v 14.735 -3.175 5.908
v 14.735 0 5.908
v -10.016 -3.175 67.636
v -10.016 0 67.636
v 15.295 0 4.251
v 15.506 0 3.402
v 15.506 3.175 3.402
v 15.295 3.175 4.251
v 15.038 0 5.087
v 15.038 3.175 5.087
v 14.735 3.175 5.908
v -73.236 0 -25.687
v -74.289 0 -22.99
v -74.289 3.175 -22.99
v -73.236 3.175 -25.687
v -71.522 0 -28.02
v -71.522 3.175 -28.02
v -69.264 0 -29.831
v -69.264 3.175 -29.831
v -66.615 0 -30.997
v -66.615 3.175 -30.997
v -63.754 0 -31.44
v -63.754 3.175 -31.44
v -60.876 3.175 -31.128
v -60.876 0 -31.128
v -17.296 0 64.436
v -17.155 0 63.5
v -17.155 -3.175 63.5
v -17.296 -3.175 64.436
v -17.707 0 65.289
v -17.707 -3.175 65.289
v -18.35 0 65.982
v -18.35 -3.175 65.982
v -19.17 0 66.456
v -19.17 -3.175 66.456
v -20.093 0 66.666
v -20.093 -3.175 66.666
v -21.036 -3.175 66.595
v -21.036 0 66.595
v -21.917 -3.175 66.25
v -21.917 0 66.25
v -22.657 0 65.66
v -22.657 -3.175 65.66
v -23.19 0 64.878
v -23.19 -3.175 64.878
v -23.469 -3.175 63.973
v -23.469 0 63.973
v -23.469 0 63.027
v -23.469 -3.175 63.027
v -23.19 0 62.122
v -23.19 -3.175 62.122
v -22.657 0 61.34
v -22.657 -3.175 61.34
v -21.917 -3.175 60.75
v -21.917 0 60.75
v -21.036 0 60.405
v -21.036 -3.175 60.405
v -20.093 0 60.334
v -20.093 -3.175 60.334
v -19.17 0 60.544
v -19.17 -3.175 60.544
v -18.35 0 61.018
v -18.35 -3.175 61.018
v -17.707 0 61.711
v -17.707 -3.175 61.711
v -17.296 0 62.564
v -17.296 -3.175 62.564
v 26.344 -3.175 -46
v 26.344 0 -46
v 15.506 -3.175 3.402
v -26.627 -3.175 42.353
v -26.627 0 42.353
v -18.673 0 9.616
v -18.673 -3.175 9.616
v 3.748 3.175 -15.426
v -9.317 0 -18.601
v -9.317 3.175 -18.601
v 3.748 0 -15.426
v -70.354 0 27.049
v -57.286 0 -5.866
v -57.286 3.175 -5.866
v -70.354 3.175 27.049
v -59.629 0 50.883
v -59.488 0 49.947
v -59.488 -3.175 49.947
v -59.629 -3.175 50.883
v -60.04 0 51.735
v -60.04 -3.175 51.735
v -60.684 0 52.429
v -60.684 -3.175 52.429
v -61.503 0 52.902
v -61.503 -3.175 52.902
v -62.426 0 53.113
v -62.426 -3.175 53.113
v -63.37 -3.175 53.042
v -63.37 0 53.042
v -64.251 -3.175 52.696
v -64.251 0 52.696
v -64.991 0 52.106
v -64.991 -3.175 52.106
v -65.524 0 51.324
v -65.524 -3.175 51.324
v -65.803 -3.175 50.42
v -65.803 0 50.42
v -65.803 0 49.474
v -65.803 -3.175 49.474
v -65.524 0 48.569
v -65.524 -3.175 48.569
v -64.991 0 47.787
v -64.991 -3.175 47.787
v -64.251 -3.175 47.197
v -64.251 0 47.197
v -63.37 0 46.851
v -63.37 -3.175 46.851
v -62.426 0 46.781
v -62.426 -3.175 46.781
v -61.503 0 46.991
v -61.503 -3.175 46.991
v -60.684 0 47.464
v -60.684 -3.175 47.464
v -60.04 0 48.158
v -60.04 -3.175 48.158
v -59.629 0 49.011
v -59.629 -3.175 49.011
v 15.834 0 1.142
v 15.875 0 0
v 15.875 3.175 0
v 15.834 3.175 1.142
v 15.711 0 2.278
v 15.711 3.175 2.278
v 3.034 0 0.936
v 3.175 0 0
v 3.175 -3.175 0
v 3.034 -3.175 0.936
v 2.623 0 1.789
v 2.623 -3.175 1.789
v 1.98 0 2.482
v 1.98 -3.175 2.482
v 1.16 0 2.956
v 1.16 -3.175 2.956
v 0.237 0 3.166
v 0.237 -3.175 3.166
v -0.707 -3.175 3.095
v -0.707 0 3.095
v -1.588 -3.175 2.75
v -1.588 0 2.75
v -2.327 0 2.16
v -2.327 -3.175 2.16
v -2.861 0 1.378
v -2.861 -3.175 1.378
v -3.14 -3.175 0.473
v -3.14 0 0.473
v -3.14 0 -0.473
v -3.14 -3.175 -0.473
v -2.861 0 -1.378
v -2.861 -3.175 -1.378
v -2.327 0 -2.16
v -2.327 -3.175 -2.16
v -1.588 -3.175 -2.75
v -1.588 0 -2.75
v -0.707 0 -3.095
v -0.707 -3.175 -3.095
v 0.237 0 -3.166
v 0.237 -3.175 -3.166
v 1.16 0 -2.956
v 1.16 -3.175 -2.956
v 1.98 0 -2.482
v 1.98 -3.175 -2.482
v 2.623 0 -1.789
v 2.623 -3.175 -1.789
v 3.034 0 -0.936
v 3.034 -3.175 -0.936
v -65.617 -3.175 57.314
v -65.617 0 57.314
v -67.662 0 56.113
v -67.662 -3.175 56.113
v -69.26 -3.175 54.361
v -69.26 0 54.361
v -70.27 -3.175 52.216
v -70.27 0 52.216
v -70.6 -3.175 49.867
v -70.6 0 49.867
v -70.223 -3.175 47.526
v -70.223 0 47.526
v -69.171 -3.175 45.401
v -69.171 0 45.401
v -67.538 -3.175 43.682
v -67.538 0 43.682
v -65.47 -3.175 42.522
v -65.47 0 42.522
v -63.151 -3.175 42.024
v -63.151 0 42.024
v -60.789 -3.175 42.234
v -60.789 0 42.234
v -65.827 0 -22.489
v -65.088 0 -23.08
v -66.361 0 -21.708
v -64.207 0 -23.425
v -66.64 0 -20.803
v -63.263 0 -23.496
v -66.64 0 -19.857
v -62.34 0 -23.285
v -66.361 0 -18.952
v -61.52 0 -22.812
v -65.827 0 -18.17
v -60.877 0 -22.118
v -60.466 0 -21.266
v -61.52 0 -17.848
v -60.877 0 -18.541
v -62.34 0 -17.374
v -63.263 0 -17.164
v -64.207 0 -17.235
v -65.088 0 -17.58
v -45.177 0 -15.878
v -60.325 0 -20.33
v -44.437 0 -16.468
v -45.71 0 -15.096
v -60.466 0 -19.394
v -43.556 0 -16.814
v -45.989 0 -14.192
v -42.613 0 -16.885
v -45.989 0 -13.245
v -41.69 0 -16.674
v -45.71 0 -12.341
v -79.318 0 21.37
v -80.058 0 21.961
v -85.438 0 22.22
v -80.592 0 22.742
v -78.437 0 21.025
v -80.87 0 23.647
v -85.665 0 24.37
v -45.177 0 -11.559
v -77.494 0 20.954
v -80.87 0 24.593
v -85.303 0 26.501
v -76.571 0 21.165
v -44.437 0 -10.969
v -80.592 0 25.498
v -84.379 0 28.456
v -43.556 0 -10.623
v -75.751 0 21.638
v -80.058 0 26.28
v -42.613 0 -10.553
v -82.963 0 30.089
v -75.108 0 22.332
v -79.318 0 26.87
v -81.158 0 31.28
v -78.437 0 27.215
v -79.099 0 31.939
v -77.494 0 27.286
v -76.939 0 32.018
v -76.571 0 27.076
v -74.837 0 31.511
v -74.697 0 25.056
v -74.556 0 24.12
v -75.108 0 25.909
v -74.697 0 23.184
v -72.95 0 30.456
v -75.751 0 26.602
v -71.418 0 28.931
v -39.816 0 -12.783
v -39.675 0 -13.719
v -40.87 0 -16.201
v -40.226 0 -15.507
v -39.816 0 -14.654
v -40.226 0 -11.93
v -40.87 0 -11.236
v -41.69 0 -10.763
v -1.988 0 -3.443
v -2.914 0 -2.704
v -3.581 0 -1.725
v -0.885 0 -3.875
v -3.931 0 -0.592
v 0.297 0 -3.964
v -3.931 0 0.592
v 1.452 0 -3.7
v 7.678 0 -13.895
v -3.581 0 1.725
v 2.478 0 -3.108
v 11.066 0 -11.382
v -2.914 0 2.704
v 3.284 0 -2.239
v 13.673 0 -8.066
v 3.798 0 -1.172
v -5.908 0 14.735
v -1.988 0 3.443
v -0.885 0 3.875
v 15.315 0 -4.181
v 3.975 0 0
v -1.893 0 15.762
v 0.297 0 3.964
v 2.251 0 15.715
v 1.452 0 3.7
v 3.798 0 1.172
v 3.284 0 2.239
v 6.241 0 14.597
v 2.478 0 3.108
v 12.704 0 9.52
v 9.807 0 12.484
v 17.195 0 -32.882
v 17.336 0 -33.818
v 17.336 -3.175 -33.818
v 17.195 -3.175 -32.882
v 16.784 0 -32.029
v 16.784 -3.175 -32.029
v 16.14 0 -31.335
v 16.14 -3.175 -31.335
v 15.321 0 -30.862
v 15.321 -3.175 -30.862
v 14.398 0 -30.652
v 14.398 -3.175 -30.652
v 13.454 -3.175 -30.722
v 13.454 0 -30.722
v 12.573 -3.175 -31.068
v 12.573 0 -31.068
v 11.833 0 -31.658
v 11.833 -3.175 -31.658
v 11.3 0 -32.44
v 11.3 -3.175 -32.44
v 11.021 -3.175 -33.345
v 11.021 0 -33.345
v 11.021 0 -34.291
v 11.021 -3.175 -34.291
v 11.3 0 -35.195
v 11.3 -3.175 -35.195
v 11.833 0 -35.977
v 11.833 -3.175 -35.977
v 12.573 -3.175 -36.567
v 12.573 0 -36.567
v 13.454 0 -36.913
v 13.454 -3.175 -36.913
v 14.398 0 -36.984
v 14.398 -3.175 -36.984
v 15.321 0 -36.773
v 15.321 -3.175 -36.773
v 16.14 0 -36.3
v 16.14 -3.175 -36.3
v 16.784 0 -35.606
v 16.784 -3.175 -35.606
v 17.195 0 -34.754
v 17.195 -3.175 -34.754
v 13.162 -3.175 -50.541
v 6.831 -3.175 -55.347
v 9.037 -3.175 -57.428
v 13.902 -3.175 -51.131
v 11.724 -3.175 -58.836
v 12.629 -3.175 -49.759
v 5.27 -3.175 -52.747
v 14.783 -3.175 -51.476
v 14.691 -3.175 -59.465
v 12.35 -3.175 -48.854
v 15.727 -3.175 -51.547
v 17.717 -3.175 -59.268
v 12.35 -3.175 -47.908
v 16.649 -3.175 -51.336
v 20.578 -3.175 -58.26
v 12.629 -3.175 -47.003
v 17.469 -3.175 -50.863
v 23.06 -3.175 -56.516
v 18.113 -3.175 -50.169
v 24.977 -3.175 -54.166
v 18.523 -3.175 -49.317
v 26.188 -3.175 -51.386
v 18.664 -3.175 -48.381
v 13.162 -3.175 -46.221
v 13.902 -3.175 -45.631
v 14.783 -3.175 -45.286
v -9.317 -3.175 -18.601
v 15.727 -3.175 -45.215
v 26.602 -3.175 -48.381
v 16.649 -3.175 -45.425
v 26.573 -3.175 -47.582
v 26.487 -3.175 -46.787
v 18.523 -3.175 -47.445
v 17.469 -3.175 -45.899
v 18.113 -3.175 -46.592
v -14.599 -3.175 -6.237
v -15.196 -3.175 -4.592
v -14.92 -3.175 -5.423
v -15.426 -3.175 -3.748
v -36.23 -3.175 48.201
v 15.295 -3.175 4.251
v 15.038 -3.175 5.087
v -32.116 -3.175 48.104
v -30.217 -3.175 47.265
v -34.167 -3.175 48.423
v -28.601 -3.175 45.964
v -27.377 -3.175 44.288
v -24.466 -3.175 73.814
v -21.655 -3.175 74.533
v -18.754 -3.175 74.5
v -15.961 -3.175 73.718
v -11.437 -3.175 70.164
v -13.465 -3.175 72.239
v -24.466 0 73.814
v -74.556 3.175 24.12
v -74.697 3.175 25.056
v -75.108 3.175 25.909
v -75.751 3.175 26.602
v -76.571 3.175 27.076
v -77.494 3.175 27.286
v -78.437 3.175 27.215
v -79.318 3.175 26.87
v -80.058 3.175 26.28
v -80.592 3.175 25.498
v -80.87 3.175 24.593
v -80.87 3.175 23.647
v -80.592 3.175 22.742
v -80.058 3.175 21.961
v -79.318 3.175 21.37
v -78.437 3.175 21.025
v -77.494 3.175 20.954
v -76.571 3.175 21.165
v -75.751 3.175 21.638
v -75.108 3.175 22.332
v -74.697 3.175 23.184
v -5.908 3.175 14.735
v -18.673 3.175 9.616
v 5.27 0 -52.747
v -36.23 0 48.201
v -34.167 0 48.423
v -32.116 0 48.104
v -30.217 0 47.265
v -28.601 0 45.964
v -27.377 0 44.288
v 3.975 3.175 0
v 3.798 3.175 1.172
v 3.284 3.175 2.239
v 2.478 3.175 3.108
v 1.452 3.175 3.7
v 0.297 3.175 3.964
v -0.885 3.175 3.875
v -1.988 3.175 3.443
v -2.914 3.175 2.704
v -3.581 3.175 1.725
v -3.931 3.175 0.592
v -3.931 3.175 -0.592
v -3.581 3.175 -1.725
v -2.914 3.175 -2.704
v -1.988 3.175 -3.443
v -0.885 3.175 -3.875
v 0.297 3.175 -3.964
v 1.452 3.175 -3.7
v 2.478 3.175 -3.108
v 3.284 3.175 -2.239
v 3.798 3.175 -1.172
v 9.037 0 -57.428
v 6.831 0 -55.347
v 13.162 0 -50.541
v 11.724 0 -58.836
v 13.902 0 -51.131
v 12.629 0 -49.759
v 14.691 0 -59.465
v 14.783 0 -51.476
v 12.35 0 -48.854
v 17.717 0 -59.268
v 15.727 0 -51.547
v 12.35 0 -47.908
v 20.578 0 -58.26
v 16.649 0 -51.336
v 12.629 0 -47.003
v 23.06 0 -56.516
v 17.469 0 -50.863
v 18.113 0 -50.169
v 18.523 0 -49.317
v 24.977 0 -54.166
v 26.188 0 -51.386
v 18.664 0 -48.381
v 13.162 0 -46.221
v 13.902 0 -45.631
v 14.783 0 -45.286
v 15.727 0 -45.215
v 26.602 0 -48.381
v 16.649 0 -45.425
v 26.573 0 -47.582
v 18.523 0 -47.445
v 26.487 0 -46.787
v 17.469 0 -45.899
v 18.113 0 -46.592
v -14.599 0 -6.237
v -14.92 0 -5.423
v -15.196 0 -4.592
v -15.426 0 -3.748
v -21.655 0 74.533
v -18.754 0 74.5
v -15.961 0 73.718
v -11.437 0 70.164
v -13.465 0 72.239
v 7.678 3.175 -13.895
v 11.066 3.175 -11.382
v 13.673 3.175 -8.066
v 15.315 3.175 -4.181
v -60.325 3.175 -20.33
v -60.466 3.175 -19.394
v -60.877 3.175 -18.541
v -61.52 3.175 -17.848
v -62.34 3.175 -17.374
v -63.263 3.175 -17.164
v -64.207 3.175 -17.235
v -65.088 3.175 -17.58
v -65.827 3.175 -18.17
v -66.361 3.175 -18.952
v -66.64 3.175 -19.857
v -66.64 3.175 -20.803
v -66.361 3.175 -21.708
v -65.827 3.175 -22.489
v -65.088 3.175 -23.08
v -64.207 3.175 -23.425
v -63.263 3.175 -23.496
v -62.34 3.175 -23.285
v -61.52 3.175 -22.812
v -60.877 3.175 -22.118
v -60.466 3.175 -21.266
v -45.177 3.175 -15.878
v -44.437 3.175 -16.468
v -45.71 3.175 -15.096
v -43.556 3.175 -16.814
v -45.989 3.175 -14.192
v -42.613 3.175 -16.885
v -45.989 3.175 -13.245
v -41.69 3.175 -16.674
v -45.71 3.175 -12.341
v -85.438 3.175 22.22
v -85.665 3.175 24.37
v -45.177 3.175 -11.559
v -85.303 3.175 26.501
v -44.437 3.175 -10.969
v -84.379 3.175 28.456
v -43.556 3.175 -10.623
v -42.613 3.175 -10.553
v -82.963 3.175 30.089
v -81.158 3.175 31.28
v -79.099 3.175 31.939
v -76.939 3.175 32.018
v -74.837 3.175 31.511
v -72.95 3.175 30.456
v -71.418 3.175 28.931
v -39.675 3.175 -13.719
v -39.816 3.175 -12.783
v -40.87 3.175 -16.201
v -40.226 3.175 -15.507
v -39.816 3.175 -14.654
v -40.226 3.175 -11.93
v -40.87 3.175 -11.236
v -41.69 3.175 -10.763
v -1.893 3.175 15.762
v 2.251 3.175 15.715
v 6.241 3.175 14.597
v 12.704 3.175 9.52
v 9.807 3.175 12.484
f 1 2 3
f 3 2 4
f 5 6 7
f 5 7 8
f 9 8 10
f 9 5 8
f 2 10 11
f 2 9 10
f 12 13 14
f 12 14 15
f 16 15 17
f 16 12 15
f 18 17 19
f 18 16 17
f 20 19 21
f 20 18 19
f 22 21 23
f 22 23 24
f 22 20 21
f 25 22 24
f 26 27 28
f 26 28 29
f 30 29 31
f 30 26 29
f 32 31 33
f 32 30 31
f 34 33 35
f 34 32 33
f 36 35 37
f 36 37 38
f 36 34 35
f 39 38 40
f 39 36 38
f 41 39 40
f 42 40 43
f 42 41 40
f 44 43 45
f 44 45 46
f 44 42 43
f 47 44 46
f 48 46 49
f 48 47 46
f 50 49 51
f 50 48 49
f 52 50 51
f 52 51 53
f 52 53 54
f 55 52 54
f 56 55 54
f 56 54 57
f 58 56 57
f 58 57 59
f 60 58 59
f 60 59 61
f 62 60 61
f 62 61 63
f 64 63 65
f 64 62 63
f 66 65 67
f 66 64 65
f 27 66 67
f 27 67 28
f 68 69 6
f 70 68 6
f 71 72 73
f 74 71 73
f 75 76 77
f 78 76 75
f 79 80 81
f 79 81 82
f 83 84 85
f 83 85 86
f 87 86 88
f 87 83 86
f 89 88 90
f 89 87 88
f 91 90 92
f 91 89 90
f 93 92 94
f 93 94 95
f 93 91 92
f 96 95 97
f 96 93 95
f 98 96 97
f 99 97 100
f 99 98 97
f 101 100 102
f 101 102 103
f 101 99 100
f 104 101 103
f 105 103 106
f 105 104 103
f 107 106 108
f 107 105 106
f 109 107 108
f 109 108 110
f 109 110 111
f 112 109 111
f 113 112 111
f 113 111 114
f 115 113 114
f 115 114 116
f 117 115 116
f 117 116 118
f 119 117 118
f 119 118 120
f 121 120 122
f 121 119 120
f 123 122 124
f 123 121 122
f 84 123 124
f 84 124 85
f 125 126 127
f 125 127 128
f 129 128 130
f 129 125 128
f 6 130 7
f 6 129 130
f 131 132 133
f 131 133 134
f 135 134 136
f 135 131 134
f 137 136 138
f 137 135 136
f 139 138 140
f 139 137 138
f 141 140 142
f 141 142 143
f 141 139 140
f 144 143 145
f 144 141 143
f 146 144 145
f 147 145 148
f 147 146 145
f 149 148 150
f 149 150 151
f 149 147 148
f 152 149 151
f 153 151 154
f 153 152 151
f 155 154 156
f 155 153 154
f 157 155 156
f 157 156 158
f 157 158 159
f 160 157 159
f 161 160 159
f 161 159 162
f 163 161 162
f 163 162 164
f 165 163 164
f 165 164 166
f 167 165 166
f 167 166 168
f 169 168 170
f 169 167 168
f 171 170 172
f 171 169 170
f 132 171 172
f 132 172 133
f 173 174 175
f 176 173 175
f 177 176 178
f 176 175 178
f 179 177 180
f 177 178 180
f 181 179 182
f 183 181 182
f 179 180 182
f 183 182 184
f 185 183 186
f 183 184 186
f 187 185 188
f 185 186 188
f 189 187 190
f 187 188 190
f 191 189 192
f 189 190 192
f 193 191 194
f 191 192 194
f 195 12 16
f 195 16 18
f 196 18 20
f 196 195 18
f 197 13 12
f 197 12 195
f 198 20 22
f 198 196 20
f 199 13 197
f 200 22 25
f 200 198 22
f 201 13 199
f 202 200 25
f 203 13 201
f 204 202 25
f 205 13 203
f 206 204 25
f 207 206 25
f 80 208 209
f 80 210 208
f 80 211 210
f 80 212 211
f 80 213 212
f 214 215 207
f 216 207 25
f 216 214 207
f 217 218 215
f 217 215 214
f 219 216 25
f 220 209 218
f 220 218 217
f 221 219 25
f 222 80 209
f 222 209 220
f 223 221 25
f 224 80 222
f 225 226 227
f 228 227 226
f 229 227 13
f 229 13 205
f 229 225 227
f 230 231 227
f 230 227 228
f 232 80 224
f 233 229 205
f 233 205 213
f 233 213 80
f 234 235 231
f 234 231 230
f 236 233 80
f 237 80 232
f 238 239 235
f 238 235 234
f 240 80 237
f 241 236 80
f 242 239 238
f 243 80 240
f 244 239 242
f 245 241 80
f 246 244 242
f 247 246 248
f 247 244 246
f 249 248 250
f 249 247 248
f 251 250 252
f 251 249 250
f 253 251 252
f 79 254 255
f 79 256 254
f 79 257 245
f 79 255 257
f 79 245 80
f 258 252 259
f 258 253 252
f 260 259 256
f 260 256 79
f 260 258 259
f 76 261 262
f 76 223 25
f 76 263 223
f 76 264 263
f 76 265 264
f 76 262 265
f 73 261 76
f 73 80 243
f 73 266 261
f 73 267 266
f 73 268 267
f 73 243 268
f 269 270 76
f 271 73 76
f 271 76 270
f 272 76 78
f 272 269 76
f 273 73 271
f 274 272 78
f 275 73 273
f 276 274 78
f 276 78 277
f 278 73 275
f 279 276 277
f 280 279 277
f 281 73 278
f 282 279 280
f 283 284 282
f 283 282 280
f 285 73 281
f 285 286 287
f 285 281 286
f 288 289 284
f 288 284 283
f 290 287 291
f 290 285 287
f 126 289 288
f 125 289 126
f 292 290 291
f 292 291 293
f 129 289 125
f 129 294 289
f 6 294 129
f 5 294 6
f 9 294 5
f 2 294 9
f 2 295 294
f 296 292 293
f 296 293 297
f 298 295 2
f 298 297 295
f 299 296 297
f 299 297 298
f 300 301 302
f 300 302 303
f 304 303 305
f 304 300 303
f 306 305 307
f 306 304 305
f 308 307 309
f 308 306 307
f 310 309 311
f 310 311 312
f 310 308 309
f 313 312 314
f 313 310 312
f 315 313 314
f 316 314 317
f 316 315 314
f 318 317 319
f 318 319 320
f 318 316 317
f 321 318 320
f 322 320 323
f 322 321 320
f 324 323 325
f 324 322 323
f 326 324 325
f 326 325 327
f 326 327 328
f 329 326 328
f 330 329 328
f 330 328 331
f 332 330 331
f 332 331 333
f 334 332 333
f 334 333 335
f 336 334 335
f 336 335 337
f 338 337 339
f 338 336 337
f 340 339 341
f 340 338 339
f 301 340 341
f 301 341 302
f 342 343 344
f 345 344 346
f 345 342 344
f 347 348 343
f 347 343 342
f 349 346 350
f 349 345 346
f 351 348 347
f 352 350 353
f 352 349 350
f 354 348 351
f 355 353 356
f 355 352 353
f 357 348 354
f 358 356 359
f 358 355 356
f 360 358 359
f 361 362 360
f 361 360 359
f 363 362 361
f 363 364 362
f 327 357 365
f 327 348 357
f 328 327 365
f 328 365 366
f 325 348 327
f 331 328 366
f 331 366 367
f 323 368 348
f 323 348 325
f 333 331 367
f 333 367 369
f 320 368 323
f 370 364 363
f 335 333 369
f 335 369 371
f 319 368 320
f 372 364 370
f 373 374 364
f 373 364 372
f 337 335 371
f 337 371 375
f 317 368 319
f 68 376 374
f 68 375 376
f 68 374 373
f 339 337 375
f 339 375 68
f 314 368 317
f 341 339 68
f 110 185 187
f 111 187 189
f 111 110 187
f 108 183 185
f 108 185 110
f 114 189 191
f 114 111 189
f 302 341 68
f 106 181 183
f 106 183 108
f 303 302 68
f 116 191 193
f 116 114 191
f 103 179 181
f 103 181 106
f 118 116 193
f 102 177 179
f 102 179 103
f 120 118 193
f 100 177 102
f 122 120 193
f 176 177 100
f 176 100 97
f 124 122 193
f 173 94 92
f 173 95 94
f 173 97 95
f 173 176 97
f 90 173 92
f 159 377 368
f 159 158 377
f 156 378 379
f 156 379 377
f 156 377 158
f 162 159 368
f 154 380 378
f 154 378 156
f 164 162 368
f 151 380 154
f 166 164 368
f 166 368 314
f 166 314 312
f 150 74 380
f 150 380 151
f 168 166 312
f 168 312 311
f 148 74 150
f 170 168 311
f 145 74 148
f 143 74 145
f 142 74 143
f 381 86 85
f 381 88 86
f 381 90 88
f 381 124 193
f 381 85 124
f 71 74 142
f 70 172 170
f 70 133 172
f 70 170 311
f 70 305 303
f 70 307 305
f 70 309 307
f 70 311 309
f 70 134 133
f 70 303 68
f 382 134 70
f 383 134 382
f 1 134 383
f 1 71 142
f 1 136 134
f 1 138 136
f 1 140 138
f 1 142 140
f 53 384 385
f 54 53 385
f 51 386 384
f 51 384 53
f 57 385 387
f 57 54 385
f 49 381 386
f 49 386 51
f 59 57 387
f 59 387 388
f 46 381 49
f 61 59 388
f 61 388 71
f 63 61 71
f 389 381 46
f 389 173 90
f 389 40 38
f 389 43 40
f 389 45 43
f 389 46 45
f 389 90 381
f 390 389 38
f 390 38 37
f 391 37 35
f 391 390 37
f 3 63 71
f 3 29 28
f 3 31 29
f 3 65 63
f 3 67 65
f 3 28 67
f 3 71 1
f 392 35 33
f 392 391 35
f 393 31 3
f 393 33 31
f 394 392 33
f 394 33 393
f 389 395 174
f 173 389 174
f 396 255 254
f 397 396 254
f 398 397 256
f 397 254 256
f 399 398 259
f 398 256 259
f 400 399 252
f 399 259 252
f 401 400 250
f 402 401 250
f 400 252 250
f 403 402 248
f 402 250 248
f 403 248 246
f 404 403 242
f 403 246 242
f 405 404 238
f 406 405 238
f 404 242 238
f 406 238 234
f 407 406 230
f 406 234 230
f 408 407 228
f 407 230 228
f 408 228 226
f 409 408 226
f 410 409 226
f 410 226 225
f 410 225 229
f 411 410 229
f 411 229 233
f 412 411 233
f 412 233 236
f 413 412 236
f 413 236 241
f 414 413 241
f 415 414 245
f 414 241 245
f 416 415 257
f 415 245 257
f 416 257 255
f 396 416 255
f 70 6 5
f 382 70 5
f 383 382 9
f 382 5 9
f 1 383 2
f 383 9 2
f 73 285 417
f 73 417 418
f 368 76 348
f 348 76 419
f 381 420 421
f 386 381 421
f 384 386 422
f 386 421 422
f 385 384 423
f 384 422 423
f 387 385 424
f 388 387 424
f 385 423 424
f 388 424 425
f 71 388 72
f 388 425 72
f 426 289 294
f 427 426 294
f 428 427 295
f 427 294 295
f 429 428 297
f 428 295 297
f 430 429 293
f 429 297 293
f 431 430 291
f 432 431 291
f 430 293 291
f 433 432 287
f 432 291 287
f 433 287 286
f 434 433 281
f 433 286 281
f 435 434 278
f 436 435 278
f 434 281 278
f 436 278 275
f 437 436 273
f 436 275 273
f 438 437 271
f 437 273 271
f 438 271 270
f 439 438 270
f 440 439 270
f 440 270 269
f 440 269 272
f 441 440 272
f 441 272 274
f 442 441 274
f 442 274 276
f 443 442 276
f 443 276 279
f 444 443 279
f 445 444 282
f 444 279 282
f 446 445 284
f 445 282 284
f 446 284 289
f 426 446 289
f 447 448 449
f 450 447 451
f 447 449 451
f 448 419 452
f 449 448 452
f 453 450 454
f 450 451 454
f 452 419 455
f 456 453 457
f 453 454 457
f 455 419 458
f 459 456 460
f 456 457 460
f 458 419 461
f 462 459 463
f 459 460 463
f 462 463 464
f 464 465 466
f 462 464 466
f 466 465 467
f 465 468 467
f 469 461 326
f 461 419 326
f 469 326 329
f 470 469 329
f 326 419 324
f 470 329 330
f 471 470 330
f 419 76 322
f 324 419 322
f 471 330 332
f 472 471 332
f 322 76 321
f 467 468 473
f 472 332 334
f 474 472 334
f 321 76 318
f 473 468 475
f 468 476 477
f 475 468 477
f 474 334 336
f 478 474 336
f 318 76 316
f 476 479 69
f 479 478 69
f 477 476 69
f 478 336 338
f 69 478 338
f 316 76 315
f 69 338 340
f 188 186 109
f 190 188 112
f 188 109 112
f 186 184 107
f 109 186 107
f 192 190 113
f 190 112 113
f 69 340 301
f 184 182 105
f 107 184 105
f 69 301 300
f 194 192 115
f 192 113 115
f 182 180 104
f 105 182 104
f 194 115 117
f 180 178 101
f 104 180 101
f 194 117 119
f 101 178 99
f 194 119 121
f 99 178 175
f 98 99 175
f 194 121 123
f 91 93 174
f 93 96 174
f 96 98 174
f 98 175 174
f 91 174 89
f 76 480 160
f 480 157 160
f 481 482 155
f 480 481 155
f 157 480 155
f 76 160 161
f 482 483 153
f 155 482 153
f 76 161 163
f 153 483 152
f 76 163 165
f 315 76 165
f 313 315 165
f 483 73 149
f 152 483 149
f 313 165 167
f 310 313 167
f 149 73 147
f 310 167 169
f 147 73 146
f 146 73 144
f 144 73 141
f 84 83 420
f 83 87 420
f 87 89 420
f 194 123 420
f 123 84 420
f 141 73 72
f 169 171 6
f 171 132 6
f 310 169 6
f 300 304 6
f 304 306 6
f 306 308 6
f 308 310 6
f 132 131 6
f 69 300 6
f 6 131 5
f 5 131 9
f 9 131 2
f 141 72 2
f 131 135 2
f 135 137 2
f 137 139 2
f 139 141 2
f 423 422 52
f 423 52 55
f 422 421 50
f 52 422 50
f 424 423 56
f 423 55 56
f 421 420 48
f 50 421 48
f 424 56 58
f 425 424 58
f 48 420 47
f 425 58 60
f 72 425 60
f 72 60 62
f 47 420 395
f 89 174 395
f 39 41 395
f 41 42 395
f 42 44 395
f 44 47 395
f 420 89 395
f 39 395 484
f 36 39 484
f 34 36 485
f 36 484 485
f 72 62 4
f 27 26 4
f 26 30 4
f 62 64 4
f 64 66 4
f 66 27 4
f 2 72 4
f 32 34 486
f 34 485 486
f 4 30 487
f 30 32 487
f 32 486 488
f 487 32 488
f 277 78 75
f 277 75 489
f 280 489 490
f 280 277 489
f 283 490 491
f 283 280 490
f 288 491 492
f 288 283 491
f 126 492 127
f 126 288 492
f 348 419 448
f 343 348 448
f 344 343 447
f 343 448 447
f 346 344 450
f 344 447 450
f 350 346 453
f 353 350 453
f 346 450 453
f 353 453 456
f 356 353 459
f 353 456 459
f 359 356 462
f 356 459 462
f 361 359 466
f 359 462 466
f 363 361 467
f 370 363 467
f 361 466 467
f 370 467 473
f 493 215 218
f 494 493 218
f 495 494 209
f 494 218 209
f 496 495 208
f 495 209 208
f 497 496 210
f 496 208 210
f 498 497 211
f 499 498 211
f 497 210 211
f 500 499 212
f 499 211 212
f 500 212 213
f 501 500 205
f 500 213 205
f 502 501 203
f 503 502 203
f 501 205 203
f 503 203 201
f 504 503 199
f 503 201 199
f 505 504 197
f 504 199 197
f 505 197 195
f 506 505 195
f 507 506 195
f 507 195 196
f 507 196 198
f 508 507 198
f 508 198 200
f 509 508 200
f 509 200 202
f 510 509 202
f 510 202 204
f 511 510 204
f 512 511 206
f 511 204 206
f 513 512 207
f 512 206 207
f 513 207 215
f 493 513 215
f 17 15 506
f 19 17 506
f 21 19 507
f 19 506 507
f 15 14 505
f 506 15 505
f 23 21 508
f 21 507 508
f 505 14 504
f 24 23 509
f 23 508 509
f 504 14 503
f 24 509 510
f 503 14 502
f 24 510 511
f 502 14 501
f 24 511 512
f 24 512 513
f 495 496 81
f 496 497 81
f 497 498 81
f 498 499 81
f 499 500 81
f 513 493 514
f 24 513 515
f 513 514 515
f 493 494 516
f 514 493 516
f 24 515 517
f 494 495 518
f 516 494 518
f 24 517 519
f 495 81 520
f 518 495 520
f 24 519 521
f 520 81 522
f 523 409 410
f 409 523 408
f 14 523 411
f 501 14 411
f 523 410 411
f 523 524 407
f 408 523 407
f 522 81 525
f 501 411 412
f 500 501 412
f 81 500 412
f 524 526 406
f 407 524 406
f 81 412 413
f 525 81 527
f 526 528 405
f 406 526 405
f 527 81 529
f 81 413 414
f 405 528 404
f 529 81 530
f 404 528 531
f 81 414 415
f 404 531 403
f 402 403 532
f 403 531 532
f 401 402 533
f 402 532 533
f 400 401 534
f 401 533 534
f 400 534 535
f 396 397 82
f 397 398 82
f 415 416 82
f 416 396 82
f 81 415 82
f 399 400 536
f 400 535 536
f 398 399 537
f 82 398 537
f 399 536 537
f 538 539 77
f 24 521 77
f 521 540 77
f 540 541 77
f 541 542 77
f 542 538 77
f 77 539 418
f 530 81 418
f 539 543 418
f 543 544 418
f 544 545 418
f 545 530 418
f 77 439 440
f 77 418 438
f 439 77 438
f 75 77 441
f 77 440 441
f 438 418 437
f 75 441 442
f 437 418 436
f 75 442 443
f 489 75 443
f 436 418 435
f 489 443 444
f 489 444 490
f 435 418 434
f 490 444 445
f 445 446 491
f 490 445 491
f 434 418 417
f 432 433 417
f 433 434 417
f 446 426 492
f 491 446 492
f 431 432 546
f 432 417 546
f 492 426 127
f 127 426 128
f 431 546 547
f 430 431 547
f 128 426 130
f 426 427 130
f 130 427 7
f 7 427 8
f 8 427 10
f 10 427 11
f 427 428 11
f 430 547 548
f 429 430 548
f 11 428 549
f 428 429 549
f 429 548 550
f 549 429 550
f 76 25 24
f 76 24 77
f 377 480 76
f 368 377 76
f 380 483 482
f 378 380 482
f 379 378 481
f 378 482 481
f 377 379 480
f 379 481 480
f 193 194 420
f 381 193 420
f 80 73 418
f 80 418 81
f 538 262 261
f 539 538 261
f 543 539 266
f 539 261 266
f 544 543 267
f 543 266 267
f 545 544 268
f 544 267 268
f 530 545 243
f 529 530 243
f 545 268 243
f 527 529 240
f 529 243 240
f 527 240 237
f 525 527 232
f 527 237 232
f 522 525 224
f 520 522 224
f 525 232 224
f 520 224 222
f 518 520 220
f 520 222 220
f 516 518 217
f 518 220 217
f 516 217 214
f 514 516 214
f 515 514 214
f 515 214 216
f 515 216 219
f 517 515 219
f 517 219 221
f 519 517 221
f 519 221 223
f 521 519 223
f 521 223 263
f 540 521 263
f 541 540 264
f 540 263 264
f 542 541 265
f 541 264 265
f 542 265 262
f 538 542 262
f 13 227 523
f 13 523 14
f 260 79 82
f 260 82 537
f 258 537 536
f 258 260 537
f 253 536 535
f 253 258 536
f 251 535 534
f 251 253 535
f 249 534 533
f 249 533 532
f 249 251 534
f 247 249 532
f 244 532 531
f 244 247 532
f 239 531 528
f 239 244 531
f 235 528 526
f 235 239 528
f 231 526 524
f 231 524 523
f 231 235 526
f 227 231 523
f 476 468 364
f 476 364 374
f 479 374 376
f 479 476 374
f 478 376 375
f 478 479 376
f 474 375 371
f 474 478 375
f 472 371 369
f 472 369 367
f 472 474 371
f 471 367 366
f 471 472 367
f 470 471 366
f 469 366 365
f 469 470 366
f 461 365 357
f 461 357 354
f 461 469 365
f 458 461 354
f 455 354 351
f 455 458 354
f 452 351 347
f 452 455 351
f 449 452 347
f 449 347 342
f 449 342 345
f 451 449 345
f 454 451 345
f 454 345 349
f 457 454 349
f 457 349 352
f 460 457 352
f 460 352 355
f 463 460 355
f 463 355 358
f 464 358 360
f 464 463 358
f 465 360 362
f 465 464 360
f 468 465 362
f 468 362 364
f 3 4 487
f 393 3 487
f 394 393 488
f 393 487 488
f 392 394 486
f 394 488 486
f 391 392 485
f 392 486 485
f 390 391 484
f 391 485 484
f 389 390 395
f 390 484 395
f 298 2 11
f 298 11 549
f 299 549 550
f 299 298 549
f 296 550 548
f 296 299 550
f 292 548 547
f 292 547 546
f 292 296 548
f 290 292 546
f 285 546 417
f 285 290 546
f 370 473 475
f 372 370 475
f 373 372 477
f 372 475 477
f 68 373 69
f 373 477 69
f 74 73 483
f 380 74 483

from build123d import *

# Parameters (mm, degrees)
F0_R     = 3.175
F0_R_2   = 3.9751
F1_DEPTH = 3.175
F2_DEPTH = 3.175


with BuildPart() as f1:
    # F0 (on Front) → F1 (new body)
    with BuildSketch(Plane.XZ):
        with BuildLine():
            ThreePointArc((-65.6172653325, 57.3140615488), (-58.215982182, 56.5213450997), (-54.7257527872, 49.9467203641))
            ThreePointArc((-54.7257527872, 49.9467203641), (-56.4230836871, 45.0411932922), (-60.7891722147, 42.2336322499))
            Line((-60.7891722147, 42.2336322499), (-36.2299590675, 48.2008847372))
            ThreePointArc((-36.2299590675, 48.2008847372), (-30.217472055, 47.2654543159), (-26.6274509109, 42.3525347834))
            Line((-26.6274509109, 42.3525347834), (-18.6733882929, 9.6162764074))
            Line((-18.6733882929, 9.6162764074), (-5.9080250905, 14.7346823695))
            ThreePointArc((-5.9080250905, 14.7346823695), (6.2413892171, 14.596598427), (14.7346823695, 5.9080250905))
            Line((14.7346823695, 5.9080250905), (-10.0156417952, 67.6356175634))
            ThreePointArc((-10.0156417952, 67.6356175634), (-9.418799742, 65.6059731442), (-9.2174194538, 63.5))
            ThreePointArc((-9.2174194538, 63.5), (-26.5560983011, 54.2955253702), (-24.4655370172, 73.8142776586))
            Line((-24.4655370172, 73.8142776586), (-65.6172653325, 57.3140615488))
        make_face()
        with BuildLine():
            Line((26.343839333, -45.9997429117), (15.5062527029, 3.4017278132))
            ThreePointArc((15.5062527029, 3.4017278132), (15.7825439435, 1.7108277736), (15.875, 0))
            ThreePointArc((15.875, 0), (12.4803382001, -9.8110541438), (3.748161145, -15.4261762285))
            Line((3.748161145, -15.4261762285), (-9.3167417356, -18.6006091284))
            Line((-9.3167417356, -18.6006091284), (5.270395532, -52.7465368502))
            ThreePointArc((5.270395532, -52.7465368502), (12.1011425321, -37.7976190476), (26.343839333, -45.9997429117))
        make_face()
        with Locations((14.1607330189, -33.8178133593)):
            Circle(F0_R, mode=Mode.SUBTRACT)
        with BuildLine():
            ThreePointArc((15.5062527029, 3.4017278132), (15.1723076697, 4.6708355759), (14.7346823695, 5.9080250905))
            ThreePointArc((14.7346823695, 5.9080250905), (6.2413892171, 14.596598427), (-5.9080250905, 14.7346823695))
            ThreePointArc((-5.9080250905, 14.7346823695), (-14.1135010743, 7.2680611187), (-15.4261762285, -3.748161145))
            ThreePointArc((-15.4261762285, -3.748161145), (-15.0638913216, -5.0094713546), (-14.598667013, -6.2365492417))
            ThreePointArc((-14.598667013, -6.2365492417), (-7.1095485396, -14.1940108695), (3.748161145, -15.4261762285))
            ThreePointArc((3.748161145, -15.4261762285), (12.4803382001, -9.8110541438), (15.875, 0))
            ThreePointArc((15.875, 0), (15.7825439435, 1.7108277736), (15.5062527029, 3.4017278132))
        make_face()
        Circle(F0_R_2, mode=Mode.SUBTRACT)
        Circle(F0_R_2)
        Circle(F0_R, mode=Mode.SUBTRACT)
        with BuildLine():
            ThreePointArc((26.601962441, -48.380952381), (26.5372432015, -47.1833729394), (26.343839333, -45.9997429117))
            ThreePointArc((26.343839333, -45.9997429117), (12.1011425321, -37.7976190476), (5.270395532, -52.7465368502))
            ThreePointArc((5.270395532, -52.7465368502), (17.7174969137, -59.2678031027), (26.601962441, -48.380952381))
        make_face()
        with Locations((15.489462441, -48.380952381)):
            Circle(F0_R, mode=Mode.SUBTRACT)
        with BuildLine():
            ThreePointArc((-10.0156417952, 67.6356175634), (-15.9609470018, 73.7176188989), (-24.4655370172, 73.8142776586))
            ThreePointArc((-24.4655370172, 73.8142776586), (-26.5560983011, 54.2955253702), (-9.2174194538, 63.5))
            ThreePointArc((-9.2174194538, 63.5), (-9.418799742, 65.6059731442), (-10.0156417952, 67.6356175634))
        make_face()
        with Locations((-20.3299194538, 63.5)):
            Circle(F0_R, mode=Mode.SUBTRACT)
        with BuildLine():
            ThreePointArc((-60.7891722147, 42.2336322499), (-56.4230836871, 45.0411932922), (-54.7257527872, 49.9467203641))
            ThreePointArc((-54.7257527872, 49.9467203641), (-58.215982182, 56.5213450997), (-65.6172653325, 57.3140615488))
            ThreePointArc((-65.6172653325, 57.3140615488), (-70.2227765967, 47.5264918577), (-60.7891722147, 42.2336322499))
        make_face()
        with Locations((-62.6632527872, 49.9467203641)):
            Circle(F0_R, mode=Mode.SUBTRACT)
        with BuildLine():
            Line((-5.9080250905, 14.7346823695), (-18.6733882929, 9.6162764074))
            Line((-18.6733882929, 9.6162764074), (-15.4261762285, -3.748161145))
            ThreePointArc((-15.4261762285, -3.748161145), (-14.1135010743, 7.2680611187), (-5.9080250905, 14.7346823695))
        make_face()
        with BuildLine():
            ThreePointArc((3.748161145, -15.4261762285), (-7.1095485396, -14.1940108695), (-14.598667013, -6.2365492417))
            Line((-14.598667013, -6.2365492417), (-9.3167417356, -18.6006091284))
            Line((-9.3167417356, -18.6006091284), (3.748161145, -15.4261762285))
        make_face()
    extrude(amount=F1_DEPTH)


with BuildPart() as f2:
    # F0 (on Front) → F2 (new body)
    with BuildSketch(Plane.XZ):
        with BuildLine():
            Line((-15.4261762285, -3.748161145), (-18.6733882929, 9.6162764074))
            Line((-18.6733882929, 9.6162764074), (-57.2861116204, -5.8658990826))
            Line((-57.2861116204, -5.8658990826), (-53.1716812698, -16.2294940542))
            ThreePointArc((-53.1716812698, -16.2294940542), (-52.5853058188, -18.2425509716), (-52.3875, -20.3299194538))
            ThreePointArc((-52.3875, -20.3299194538), (-54.7637632599, -27.1976573545), (-60.8762871985, -31.1282428138))
            Line((-60.8762871985, -31.1282428138), (-9.3167417356, -18.6006091284))
            Line((-9.3167417356, -18.6006091284), (-14.598667013, -6.2365492417))
            ThreePointArc((-14.598667013, -6.2365492417), (-15.0638913216, -5.0094713546), (-15.4261762285, -3.748161145))
        make_face()
        with Locations((-42.8498, -13.7186296475)):
            Circle(F0_R, mode=Mode.SUBTRACT)
        with BuildLine():
            Line((-67.6356175634, -10.0156417952), (-57.2861116204, -5.8658990826))
            Line((-57.2861116204, -5.8658990826), (-70.3535730961, 27.0489558316))
            ThreePointArc((-70.3535730961, 27.0489558316), (-69.9347334883, 25.6110580334), (-69.7934436177, 24.1200805462))
            ThreePointArc((-69.7934436177, 24.1200805462), (-76.7737744608, 16.2405035616), (-85.4375969292, 22.2197119014))
            Line((-85.4375969292, 22.2197119014), (-74.2893146361, -22.9904355564))
            ThreePointArc((-74.2893146361, -22.9904355564), (-73.3881099598, -15.2591268459), (-67.6356175634, -10.0156417952))
        make_face()
        with BuildLine():
            ThreePointArc((-52.3875, -20.3299194538), (-52.5853058188, -18.2425509716), (-53.1716812698, -16.2294940542))
            ThreePointArc((-53.1716812698, -16.2294940542), (-59.1136145963, -10.1197637577), (-67.6356175634, -10.0156417952))
            ThreePointArc((-67.6356175634, -10.0156417952), (-73.3881099598, -15.2591268459), (-74.2893146361, -22.9904355564))
            ThreePointArc((-74.2893146361, -22.9904355564), (-69.2641339393, -29.8305729145), (-60.8762871985, -31.1282428138))
            ThreePointArc((-60.8762871985, -31.1282428138), (-54.7637632599, -27.1976573545), (-52.3875, -20.3299194538))
        make_face()
        with Locations((-63.5, -20.3299194538)):
            Circle(F0_R, mode=Mode.SUBTRACT)
        with BuildLine():
            Line((-53.1716812698, -16.2294940542), (-57.2861116204, -5.8658990826))
            Line((-57.2861116204, -5.8658990826), (-67.6356175634, -10.0156417952))
            ThreePointArc((-67.6356175634, -10.0156417952), (-59.1136145963, -10.1197637577), (-53.1716812698, -16.2294940542))
        make_face()
        with BuildLine():
            ThreePointArc((-69.7934436177, 24.1200805462), (-69.9347334883, 25.6110580334), (-70.3535730961, 27.0489558316))
            ThreePointArc((-70.3535730961, 27.0489558316), (-80.1511721241, 31.6796043557), (-85.4375969292, 22.2197119014))
            ThreePointArc((-85.4375969292, 22.2197119014), (-76.7737744608, 16.2405035616), (-69.7934436177, 24.1200805462))
        make_face()
        with Locations((-77.7309436177, 24.1200805462)):
            Circle(F0_R, mode=Mode.SUBTRACT)
        with BuildLine():
            ThreePointArc((15.5062527029, 3.4017278132), (15.1723076697, 4.6708355759), (14.7346823695, 5.9080250905))
            ThreePointArc((14.7346823695, 5.9080250905), (6.2413892171, 14.596598427), (-5.9080250905, 14.7346823695))
            ThreePointArc((-5.9080250905, 14.7346823695), (-14.1135010743, 7.2680611187), (-15.4261762285, -3.748161145))
            ThreePointArc((-15.4261762285, -3.748161145), (-15.0638913216, -5.0094713546), (-14.598667013, -6.2365492417))
            ThreePointArc((-14.598667013, -6.2365492417), (-7.1095485396, -14.1940108695), (3.748161145, -15.4261762285))
            ThreePointArc((3.748161145, -15.4261762285), (12.4803382001, -9.8110541438), (15.875, 0))
            ThreePointArc((15.875, 0), (15.7825439435, 1.7108277736), (15.5062527029, 3.4017278132))
        make_face()
        Circle(F0_R_2, mode=Mode.SUBTRACT)
        with BuildLine():
            ThreePointArc((3.748161145, -15.4261762285), (-7.1095485396, -14.1940108695), (-14.598667013, -6.2365492417))
            Line((-14.598667013, -6.2365492417), (-9.3167417356, -18.6006091284))
            Line((-9.3167417356, -18.6006091284), (3.748161145, -15.4261762285))
        make_face()
        with BuildLine():
            Line((-5.9080250905, 14.7346823695), (-18.6733882929, 9.6162764074))
            Line((-18.6733882929, 9.6162764074), (-15.4261762285, -3.748161145))
            ThreePointArc((-15.4261762285, -3.748161145), (-14.1135010743, 7.2680611187), (-5.9080250905, 14.7346823695))
        make_face()
    extrude(amount=-F2_DEPTH)


solid = Compound([f1.part, f2.part])
